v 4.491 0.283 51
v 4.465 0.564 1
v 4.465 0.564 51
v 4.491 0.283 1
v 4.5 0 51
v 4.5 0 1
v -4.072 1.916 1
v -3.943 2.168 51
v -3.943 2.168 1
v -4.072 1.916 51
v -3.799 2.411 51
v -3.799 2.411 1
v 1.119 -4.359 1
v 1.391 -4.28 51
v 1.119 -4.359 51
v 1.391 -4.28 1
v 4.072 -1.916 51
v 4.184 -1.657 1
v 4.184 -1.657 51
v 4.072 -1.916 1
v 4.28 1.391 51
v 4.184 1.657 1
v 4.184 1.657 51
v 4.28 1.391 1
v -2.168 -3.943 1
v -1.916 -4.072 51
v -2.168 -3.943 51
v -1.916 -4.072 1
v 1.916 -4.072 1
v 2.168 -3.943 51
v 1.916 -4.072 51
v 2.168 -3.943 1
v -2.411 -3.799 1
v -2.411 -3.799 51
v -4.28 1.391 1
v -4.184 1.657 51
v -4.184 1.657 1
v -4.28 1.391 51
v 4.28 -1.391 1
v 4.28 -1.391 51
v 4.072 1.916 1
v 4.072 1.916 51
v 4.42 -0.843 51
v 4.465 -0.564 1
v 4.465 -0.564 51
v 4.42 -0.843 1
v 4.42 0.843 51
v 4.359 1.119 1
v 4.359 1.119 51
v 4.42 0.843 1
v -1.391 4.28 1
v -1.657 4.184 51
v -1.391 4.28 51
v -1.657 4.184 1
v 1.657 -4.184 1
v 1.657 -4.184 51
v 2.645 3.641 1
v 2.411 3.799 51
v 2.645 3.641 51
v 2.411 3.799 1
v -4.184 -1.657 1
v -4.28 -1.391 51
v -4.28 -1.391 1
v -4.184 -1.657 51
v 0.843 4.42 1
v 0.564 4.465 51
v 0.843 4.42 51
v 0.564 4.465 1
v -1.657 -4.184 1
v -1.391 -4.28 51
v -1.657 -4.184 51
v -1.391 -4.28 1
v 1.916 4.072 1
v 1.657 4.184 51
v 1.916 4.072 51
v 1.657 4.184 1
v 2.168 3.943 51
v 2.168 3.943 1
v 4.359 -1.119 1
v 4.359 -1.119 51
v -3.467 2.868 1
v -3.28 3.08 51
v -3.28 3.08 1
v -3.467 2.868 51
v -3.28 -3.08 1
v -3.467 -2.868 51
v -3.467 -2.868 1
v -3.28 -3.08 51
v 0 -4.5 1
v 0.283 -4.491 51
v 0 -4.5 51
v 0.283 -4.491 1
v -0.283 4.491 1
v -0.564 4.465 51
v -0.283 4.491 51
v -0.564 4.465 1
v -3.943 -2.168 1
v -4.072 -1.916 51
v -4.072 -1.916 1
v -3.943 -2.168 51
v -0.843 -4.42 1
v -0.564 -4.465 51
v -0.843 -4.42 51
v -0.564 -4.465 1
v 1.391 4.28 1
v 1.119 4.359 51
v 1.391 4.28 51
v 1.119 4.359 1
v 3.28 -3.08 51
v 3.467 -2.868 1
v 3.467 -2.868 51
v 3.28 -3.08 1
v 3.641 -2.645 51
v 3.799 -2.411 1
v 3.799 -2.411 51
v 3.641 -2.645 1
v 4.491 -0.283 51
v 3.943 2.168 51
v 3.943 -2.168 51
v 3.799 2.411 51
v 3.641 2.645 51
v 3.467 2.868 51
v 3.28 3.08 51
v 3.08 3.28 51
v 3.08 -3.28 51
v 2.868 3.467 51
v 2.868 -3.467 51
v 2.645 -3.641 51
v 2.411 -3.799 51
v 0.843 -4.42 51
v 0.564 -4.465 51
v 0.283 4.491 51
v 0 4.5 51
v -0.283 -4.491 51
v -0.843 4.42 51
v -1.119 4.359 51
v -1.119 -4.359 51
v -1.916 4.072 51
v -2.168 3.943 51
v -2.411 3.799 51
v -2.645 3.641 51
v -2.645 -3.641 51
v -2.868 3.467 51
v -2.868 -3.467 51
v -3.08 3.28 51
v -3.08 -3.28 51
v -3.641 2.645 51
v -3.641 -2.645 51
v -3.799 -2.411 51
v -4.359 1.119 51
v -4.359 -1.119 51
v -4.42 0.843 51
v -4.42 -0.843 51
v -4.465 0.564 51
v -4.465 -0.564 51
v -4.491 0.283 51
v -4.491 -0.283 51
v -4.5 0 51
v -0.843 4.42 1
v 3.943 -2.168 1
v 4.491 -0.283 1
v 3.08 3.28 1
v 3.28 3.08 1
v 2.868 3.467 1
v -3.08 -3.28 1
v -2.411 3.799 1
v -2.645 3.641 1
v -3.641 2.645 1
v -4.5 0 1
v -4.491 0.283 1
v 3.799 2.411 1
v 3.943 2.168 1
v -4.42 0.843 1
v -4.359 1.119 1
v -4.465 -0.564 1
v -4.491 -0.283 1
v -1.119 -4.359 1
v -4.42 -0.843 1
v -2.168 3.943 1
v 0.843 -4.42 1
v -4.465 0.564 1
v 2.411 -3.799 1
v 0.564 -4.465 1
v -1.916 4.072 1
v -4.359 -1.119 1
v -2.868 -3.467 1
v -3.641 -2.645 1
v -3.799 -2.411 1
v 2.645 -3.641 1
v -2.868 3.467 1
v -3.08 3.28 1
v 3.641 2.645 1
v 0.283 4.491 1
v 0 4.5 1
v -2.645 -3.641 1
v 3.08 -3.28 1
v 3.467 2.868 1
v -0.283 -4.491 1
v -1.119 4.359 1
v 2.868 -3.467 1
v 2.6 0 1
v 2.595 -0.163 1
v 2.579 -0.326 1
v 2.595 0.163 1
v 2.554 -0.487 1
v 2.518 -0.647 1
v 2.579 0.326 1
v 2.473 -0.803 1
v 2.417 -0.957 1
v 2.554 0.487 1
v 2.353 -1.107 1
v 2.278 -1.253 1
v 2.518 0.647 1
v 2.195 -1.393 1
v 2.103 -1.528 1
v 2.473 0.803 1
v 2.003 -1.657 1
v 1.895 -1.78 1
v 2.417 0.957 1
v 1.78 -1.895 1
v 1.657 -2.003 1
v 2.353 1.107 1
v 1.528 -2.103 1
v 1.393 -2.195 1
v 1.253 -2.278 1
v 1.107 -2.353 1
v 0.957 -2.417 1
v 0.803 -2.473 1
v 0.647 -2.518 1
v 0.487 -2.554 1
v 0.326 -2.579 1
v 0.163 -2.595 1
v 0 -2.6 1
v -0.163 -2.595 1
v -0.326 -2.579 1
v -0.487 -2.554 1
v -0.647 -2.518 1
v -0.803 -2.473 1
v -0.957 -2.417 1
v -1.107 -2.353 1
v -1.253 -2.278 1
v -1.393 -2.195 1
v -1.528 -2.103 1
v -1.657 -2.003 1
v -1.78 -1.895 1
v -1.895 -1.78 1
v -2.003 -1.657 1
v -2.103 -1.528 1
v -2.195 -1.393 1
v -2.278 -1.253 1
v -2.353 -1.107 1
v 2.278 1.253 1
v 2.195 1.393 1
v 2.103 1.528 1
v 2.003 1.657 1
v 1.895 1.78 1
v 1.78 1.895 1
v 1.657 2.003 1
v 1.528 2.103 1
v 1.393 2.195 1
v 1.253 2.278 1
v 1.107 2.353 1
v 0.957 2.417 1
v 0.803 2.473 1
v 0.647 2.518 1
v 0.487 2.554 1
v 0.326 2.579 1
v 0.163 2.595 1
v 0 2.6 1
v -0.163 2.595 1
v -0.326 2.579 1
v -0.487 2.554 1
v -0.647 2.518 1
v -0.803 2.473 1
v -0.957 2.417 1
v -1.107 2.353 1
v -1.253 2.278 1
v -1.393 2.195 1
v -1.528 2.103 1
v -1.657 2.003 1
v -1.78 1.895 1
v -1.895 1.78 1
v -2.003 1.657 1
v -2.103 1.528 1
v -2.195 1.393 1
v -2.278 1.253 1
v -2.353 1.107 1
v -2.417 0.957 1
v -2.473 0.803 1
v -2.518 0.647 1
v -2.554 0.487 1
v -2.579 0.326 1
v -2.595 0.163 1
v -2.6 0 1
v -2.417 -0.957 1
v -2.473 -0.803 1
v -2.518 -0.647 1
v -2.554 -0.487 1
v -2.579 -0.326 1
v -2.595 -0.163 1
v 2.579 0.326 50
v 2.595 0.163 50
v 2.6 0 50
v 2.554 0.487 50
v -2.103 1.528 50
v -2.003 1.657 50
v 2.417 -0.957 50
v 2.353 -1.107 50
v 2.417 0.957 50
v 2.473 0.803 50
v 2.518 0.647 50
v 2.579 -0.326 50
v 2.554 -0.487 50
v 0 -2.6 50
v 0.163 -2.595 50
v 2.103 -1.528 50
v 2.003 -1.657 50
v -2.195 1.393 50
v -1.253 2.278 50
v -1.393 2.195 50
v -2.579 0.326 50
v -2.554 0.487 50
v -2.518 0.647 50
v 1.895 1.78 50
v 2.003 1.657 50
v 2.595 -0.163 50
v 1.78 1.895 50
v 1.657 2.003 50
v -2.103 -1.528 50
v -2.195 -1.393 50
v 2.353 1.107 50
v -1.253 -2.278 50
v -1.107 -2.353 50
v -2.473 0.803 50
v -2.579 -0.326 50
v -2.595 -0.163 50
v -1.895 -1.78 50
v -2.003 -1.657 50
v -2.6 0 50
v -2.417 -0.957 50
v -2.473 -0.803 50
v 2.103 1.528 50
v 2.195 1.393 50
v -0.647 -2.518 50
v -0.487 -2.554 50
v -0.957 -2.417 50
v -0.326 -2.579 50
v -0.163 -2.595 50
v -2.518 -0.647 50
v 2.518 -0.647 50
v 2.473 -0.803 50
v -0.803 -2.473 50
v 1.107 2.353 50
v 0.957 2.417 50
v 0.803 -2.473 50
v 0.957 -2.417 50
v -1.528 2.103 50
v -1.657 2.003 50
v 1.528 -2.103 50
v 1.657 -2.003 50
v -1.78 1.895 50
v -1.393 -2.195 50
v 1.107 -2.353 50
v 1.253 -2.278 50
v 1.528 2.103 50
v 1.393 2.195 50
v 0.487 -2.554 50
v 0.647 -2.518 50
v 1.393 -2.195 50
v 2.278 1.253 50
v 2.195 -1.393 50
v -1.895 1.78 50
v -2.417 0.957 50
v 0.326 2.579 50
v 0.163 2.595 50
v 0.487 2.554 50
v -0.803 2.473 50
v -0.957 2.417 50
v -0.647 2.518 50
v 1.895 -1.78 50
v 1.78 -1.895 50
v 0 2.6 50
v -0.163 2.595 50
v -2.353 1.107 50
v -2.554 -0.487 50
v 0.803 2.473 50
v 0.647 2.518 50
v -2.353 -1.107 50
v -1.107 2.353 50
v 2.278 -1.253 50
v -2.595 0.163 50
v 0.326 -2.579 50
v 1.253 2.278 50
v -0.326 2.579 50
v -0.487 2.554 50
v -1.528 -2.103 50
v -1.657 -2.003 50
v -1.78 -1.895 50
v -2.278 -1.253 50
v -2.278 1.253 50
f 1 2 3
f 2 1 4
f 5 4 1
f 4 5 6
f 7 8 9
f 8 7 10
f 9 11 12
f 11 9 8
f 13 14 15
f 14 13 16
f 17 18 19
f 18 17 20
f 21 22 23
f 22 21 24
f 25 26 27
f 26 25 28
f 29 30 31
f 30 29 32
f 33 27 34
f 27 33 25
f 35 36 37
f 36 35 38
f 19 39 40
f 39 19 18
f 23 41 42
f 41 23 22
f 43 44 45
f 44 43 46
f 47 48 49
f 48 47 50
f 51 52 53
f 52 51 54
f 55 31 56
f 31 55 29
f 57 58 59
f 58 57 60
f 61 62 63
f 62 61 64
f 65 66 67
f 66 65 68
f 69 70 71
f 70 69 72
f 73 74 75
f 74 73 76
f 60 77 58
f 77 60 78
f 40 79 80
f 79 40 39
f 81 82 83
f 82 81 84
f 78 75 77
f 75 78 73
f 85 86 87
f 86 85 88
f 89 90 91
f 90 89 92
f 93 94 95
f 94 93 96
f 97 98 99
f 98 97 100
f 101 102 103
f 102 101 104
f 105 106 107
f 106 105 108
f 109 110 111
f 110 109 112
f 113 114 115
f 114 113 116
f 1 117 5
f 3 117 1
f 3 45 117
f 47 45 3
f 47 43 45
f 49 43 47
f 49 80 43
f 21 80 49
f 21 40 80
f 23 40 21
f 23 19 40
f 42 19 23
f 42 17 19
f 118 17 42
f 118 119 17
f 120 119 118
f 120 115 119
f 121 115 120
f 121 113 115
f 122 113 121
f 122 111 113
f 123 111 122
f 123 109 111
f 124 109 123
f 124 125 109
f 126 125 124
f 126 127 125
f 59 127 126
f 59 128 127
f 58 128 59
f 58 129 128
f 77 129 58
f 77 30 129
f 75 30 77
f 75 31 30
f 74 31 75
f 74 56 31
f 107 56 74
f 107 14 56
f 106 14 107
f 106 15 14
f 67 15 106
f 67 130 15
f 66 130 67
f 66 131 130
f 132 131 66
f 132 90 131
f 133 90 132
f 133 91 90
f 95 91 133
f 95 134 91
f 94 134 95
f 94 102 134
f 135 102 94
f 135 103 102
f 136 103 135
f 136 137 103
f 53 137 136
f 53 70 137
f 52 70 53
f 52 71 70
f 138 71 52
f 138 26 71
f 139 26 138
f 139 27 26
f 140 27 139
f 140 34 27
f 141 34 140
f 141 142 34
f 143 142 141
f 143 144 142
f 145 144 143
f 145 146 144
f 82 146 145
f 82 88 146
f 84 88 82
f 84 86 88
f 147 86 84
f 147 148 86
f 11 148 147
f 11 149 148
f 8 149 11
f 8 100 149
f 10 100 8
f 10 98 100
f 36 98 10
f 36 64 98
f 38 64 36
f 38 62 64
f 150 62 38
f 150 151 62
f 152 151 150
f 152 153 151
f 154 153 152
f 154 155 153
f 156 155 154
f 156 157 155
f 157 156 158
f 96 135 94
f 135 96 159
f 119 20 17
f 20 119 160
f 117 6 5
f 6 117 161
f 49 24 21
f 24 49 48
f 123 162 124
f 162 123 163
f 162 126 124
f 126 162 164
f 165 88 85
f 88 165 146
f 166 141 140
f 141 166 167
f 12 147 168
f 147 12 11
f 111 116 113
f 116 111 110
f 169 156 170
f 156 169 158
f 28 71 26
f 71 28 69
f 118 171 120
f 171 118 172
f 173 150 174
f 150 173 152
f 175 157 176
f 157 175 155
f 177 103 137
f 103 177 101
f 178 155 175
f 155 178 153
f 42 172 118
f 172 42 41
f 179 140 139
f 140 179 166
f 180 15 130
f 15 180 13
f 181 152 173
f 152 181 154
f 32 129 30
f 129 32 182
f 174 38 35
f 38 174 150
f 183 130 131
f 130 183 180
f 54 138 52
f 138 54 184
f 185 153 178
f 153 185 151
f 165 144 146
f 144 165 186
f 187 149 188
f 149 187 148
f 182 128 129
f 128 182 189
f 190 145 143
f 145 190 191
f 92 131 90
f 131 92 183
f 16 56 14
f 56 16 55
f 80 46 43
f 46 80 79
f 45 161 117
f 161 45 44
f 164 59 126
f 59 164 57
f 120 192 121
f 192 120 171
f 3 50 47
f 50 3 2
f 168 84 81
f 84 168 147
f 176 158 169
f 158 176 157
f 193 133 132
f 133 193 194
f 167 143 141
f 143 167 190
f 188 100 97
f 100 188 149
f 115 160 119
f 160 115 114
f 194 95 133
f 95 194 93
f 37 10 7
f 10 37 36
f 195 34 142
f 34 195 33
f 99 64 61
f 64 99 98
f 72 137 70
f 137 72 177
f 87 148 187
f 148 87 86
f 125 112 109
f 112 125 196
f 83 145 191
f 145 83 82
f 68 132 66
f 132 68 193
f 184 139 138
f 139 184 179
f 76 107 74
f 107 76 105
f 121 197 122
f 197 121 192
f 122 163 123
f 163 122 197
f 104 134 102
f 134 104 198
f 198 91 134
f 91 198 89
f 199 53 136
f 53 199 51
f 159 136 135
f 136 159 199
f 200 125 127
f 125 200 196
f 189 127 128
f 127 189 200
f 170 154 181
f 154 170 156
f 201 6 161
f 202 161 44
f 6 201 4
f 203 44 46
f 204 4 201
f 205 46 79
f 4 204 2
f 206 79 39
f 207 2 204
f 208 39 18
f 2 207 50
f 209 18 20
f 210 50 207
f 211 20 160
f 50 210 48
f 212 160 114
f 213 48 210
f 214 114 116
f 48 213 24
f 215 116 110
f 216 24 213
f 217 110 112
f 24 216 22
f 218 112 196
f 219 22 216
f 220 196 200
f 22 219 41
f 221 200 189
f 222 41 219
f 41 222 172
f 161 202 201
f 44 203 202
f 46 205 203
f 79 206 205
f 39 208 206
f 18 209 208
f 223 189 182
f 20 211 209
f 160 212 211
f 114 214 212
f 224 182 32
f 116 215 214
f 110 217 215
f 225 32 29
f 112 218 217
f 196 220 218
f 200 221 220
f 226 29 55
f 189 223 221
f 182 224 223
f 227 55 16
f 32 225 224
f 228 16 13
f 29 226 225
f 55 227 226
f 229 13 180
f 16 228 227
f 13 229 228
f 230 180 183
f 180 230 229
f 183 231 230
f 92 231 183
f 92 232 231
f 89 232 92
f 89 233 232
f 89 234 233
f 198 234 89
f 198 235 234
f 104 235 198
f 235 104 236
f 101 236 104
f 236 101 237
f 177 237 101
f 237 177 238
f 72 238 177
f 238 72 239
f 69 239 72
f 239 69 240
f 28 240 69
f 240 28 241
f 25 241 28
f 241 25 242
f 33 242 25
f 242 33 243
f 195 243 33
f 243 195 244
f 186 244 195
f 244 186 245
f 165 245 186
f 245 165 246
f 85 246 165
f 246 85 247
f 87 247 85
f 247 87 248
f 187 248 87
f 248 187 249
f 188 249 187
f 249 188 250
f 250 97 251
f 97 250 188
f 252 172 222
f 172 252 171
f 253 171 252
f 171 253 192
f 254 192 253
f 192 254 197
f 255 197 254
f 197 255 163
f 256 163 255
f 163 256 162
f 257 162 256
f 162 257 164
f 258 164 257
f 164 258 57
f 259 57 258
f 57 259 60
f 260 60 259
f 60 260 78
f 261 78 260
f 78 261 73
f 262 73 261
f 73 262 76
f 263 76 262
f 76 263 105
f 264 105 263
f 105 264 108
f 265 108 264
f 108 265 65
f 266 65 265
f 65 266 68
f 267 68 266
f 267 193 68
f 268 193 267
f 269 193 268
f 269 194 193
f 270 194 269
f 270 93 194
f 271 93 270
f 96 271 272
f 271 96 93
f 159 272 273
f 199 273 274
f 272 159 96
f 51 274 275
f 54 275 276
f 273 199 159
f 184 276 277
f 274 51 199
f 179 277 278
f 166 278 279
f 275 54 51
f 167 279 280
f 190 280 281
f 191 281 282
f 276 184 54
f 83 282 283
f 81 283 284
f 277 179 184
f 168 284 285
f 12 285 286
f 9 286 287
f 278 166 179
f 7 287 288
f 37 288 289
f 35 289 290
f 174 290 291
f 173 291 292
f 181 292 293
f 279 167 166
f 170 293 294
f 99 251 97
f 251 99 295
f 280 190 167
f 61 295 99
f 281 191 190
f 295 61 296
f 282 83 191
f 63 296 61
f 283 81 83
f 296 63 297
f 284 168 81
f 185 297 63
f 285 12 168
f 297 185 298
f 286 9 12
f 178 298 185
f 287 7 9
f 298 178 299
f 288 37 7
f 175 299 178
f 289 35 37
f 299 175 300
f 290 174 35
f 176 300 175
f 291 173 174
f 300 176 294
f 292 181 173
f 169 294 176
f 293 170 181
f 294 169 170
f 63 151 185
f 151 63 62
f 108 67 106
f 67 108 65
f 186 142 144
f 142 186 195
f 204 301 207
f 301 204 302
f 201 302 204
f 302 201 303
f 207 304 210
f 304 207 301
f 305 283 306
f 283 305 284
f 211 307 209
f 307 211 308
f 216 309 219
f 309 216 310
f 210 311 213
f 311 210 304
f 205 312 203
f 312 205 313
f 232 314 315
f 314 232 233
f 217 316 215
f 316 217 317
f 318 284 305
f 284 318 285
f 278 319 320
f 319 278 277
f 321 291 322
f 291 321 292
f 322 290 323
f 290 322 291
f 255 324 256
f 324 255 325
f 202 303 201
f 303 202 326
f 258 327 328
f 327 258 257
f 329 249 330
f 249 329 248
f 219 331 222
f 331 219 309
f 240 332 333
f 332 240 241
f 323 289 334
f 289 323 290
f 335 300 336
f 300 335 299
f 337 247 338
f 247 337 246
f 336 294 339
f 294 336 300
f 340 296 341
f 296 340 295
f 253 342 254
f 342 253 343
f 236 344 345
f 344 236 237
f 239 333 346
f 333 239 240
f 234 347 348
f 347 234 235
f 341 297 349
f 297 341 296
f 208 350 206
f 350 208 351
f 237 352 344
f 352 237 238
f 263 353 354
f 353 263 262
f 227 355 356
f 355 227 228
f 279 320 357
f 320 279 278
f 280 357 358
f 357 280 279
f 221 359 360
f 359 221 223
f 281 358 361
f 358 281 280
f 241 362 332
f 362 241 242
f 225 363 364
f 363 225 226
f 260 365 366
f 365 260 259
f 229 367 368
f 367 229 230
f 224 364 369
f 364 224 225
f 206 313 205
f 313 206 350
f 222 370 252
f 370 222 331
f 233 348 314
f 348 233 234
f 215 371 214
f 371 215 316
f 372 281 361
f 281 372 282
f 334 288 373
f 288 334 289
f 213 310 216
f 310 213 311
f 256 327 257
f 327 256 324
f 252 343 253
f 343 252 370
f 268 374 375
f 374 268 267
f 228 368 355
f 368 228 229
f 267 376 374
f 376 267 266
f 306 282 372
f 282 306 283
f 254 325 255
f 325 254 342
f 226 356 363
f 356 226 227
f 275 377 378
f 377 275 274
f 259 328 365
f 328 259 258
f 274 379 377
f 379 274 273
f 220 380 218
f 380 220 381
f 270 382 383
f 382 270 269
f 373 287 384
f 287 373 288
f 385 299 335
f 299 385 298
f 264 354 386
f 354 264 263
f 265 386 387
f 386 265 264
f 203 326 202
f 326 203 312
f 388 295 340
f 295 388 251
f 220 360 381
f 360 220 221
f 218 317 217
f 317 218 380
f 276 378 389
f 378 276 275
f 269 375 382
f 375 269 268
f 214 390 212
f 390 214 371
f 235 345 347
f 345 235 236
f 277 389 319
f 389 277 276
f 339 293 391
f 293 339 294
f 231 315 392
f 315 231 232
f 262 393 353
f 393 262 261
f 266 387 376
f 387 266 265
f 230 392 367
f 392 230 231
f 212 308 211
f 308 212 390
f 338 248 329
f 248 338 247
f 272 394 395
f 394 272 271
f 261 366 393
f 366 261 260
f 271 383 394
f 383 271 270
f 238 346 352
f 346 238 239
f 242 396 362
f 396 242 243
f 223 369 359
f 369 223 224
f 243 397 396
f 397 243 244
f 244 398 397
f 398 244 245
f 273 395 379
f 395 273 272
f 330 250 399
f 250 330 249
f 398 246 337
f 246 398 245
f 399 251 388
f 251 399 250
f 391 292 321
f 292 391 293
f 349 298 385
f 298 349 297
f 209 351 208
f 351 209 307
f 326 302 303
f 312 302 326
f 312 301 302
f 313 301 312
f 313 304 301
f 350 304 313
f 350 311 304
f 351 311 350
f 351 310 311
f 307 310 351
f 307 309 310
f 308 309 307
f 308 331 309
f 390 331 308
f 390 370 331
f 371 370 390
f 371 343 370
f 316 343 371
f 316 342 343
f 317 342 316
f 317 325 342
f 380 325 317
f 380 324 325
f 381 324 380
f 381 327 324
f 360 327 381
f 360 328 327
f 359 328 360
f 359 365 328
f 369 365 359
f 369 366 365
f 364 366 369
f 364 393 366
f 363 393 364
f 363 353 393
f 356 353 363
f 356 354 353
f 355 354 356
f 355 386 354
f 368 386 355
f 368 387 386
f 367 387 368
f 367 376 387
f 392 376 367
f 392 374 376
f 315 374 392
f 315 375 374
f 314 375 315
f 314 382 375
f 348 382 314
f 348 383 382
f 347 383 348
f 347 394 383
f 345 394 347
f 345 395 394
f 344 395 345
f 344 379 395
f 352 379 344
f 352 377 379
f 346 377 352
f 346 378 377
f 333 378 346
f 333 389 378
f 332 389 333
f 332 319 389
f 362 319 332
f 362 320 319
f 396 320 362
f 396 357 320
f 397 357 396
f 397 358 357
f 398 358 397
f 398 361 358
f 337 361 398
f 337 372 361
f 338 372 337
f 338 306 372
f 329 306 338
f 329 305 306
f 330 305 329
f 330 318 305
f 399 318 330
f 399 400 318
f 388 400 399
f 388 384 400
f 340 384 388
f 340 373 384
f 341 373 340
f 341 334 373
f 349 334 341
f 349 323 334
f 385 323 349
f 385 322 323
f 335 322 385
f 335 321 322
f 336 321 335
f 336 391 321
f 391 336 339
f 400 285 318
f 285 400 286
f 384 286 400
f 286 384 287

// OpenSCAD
SPRING_DIAMETER = 9;
SPRING_HEIGHT = 35;
GAP = 2;
WALL_THICKNESS = 2;
SPRING_OUTER_GAP = 0.1;

spring_radius = SPRING_DIAMETER / 2;

height = SPRING_HEIGHT + 15;

module spring_holder() {
    difference() {
        cylinder(height, spring_radius + WALL_THICKNESS + SPRING_OUTER_GAP, spring_radius + WALL_THICKNESS + SPRING_OUTER_GAP, $fn = 100);
        translate([0, 0, 1]) {
            cylinder(height, spring_radius + SPRING_OUTER_GAP, spring_radius + SPRING_OUTER_GAP, $fn = 100);
        }
    }

    cylinder(height, spring_radius - GAP, spring_radius - GAP, $fn = 100);
}

//spring_holder();

difference() {
    translate([0, 0, 1]) {
        cylinder(height, spring_radius + SPRING_OUTER_GAP - 0.1, spring_radius + SPRING_OUTER_GAP - 0.1, $fn = 100);
    }
    cylinder(height, spring_radius - GAP + 0.1, spring_radius - GAP + 0.1, $fn = 100);
}
